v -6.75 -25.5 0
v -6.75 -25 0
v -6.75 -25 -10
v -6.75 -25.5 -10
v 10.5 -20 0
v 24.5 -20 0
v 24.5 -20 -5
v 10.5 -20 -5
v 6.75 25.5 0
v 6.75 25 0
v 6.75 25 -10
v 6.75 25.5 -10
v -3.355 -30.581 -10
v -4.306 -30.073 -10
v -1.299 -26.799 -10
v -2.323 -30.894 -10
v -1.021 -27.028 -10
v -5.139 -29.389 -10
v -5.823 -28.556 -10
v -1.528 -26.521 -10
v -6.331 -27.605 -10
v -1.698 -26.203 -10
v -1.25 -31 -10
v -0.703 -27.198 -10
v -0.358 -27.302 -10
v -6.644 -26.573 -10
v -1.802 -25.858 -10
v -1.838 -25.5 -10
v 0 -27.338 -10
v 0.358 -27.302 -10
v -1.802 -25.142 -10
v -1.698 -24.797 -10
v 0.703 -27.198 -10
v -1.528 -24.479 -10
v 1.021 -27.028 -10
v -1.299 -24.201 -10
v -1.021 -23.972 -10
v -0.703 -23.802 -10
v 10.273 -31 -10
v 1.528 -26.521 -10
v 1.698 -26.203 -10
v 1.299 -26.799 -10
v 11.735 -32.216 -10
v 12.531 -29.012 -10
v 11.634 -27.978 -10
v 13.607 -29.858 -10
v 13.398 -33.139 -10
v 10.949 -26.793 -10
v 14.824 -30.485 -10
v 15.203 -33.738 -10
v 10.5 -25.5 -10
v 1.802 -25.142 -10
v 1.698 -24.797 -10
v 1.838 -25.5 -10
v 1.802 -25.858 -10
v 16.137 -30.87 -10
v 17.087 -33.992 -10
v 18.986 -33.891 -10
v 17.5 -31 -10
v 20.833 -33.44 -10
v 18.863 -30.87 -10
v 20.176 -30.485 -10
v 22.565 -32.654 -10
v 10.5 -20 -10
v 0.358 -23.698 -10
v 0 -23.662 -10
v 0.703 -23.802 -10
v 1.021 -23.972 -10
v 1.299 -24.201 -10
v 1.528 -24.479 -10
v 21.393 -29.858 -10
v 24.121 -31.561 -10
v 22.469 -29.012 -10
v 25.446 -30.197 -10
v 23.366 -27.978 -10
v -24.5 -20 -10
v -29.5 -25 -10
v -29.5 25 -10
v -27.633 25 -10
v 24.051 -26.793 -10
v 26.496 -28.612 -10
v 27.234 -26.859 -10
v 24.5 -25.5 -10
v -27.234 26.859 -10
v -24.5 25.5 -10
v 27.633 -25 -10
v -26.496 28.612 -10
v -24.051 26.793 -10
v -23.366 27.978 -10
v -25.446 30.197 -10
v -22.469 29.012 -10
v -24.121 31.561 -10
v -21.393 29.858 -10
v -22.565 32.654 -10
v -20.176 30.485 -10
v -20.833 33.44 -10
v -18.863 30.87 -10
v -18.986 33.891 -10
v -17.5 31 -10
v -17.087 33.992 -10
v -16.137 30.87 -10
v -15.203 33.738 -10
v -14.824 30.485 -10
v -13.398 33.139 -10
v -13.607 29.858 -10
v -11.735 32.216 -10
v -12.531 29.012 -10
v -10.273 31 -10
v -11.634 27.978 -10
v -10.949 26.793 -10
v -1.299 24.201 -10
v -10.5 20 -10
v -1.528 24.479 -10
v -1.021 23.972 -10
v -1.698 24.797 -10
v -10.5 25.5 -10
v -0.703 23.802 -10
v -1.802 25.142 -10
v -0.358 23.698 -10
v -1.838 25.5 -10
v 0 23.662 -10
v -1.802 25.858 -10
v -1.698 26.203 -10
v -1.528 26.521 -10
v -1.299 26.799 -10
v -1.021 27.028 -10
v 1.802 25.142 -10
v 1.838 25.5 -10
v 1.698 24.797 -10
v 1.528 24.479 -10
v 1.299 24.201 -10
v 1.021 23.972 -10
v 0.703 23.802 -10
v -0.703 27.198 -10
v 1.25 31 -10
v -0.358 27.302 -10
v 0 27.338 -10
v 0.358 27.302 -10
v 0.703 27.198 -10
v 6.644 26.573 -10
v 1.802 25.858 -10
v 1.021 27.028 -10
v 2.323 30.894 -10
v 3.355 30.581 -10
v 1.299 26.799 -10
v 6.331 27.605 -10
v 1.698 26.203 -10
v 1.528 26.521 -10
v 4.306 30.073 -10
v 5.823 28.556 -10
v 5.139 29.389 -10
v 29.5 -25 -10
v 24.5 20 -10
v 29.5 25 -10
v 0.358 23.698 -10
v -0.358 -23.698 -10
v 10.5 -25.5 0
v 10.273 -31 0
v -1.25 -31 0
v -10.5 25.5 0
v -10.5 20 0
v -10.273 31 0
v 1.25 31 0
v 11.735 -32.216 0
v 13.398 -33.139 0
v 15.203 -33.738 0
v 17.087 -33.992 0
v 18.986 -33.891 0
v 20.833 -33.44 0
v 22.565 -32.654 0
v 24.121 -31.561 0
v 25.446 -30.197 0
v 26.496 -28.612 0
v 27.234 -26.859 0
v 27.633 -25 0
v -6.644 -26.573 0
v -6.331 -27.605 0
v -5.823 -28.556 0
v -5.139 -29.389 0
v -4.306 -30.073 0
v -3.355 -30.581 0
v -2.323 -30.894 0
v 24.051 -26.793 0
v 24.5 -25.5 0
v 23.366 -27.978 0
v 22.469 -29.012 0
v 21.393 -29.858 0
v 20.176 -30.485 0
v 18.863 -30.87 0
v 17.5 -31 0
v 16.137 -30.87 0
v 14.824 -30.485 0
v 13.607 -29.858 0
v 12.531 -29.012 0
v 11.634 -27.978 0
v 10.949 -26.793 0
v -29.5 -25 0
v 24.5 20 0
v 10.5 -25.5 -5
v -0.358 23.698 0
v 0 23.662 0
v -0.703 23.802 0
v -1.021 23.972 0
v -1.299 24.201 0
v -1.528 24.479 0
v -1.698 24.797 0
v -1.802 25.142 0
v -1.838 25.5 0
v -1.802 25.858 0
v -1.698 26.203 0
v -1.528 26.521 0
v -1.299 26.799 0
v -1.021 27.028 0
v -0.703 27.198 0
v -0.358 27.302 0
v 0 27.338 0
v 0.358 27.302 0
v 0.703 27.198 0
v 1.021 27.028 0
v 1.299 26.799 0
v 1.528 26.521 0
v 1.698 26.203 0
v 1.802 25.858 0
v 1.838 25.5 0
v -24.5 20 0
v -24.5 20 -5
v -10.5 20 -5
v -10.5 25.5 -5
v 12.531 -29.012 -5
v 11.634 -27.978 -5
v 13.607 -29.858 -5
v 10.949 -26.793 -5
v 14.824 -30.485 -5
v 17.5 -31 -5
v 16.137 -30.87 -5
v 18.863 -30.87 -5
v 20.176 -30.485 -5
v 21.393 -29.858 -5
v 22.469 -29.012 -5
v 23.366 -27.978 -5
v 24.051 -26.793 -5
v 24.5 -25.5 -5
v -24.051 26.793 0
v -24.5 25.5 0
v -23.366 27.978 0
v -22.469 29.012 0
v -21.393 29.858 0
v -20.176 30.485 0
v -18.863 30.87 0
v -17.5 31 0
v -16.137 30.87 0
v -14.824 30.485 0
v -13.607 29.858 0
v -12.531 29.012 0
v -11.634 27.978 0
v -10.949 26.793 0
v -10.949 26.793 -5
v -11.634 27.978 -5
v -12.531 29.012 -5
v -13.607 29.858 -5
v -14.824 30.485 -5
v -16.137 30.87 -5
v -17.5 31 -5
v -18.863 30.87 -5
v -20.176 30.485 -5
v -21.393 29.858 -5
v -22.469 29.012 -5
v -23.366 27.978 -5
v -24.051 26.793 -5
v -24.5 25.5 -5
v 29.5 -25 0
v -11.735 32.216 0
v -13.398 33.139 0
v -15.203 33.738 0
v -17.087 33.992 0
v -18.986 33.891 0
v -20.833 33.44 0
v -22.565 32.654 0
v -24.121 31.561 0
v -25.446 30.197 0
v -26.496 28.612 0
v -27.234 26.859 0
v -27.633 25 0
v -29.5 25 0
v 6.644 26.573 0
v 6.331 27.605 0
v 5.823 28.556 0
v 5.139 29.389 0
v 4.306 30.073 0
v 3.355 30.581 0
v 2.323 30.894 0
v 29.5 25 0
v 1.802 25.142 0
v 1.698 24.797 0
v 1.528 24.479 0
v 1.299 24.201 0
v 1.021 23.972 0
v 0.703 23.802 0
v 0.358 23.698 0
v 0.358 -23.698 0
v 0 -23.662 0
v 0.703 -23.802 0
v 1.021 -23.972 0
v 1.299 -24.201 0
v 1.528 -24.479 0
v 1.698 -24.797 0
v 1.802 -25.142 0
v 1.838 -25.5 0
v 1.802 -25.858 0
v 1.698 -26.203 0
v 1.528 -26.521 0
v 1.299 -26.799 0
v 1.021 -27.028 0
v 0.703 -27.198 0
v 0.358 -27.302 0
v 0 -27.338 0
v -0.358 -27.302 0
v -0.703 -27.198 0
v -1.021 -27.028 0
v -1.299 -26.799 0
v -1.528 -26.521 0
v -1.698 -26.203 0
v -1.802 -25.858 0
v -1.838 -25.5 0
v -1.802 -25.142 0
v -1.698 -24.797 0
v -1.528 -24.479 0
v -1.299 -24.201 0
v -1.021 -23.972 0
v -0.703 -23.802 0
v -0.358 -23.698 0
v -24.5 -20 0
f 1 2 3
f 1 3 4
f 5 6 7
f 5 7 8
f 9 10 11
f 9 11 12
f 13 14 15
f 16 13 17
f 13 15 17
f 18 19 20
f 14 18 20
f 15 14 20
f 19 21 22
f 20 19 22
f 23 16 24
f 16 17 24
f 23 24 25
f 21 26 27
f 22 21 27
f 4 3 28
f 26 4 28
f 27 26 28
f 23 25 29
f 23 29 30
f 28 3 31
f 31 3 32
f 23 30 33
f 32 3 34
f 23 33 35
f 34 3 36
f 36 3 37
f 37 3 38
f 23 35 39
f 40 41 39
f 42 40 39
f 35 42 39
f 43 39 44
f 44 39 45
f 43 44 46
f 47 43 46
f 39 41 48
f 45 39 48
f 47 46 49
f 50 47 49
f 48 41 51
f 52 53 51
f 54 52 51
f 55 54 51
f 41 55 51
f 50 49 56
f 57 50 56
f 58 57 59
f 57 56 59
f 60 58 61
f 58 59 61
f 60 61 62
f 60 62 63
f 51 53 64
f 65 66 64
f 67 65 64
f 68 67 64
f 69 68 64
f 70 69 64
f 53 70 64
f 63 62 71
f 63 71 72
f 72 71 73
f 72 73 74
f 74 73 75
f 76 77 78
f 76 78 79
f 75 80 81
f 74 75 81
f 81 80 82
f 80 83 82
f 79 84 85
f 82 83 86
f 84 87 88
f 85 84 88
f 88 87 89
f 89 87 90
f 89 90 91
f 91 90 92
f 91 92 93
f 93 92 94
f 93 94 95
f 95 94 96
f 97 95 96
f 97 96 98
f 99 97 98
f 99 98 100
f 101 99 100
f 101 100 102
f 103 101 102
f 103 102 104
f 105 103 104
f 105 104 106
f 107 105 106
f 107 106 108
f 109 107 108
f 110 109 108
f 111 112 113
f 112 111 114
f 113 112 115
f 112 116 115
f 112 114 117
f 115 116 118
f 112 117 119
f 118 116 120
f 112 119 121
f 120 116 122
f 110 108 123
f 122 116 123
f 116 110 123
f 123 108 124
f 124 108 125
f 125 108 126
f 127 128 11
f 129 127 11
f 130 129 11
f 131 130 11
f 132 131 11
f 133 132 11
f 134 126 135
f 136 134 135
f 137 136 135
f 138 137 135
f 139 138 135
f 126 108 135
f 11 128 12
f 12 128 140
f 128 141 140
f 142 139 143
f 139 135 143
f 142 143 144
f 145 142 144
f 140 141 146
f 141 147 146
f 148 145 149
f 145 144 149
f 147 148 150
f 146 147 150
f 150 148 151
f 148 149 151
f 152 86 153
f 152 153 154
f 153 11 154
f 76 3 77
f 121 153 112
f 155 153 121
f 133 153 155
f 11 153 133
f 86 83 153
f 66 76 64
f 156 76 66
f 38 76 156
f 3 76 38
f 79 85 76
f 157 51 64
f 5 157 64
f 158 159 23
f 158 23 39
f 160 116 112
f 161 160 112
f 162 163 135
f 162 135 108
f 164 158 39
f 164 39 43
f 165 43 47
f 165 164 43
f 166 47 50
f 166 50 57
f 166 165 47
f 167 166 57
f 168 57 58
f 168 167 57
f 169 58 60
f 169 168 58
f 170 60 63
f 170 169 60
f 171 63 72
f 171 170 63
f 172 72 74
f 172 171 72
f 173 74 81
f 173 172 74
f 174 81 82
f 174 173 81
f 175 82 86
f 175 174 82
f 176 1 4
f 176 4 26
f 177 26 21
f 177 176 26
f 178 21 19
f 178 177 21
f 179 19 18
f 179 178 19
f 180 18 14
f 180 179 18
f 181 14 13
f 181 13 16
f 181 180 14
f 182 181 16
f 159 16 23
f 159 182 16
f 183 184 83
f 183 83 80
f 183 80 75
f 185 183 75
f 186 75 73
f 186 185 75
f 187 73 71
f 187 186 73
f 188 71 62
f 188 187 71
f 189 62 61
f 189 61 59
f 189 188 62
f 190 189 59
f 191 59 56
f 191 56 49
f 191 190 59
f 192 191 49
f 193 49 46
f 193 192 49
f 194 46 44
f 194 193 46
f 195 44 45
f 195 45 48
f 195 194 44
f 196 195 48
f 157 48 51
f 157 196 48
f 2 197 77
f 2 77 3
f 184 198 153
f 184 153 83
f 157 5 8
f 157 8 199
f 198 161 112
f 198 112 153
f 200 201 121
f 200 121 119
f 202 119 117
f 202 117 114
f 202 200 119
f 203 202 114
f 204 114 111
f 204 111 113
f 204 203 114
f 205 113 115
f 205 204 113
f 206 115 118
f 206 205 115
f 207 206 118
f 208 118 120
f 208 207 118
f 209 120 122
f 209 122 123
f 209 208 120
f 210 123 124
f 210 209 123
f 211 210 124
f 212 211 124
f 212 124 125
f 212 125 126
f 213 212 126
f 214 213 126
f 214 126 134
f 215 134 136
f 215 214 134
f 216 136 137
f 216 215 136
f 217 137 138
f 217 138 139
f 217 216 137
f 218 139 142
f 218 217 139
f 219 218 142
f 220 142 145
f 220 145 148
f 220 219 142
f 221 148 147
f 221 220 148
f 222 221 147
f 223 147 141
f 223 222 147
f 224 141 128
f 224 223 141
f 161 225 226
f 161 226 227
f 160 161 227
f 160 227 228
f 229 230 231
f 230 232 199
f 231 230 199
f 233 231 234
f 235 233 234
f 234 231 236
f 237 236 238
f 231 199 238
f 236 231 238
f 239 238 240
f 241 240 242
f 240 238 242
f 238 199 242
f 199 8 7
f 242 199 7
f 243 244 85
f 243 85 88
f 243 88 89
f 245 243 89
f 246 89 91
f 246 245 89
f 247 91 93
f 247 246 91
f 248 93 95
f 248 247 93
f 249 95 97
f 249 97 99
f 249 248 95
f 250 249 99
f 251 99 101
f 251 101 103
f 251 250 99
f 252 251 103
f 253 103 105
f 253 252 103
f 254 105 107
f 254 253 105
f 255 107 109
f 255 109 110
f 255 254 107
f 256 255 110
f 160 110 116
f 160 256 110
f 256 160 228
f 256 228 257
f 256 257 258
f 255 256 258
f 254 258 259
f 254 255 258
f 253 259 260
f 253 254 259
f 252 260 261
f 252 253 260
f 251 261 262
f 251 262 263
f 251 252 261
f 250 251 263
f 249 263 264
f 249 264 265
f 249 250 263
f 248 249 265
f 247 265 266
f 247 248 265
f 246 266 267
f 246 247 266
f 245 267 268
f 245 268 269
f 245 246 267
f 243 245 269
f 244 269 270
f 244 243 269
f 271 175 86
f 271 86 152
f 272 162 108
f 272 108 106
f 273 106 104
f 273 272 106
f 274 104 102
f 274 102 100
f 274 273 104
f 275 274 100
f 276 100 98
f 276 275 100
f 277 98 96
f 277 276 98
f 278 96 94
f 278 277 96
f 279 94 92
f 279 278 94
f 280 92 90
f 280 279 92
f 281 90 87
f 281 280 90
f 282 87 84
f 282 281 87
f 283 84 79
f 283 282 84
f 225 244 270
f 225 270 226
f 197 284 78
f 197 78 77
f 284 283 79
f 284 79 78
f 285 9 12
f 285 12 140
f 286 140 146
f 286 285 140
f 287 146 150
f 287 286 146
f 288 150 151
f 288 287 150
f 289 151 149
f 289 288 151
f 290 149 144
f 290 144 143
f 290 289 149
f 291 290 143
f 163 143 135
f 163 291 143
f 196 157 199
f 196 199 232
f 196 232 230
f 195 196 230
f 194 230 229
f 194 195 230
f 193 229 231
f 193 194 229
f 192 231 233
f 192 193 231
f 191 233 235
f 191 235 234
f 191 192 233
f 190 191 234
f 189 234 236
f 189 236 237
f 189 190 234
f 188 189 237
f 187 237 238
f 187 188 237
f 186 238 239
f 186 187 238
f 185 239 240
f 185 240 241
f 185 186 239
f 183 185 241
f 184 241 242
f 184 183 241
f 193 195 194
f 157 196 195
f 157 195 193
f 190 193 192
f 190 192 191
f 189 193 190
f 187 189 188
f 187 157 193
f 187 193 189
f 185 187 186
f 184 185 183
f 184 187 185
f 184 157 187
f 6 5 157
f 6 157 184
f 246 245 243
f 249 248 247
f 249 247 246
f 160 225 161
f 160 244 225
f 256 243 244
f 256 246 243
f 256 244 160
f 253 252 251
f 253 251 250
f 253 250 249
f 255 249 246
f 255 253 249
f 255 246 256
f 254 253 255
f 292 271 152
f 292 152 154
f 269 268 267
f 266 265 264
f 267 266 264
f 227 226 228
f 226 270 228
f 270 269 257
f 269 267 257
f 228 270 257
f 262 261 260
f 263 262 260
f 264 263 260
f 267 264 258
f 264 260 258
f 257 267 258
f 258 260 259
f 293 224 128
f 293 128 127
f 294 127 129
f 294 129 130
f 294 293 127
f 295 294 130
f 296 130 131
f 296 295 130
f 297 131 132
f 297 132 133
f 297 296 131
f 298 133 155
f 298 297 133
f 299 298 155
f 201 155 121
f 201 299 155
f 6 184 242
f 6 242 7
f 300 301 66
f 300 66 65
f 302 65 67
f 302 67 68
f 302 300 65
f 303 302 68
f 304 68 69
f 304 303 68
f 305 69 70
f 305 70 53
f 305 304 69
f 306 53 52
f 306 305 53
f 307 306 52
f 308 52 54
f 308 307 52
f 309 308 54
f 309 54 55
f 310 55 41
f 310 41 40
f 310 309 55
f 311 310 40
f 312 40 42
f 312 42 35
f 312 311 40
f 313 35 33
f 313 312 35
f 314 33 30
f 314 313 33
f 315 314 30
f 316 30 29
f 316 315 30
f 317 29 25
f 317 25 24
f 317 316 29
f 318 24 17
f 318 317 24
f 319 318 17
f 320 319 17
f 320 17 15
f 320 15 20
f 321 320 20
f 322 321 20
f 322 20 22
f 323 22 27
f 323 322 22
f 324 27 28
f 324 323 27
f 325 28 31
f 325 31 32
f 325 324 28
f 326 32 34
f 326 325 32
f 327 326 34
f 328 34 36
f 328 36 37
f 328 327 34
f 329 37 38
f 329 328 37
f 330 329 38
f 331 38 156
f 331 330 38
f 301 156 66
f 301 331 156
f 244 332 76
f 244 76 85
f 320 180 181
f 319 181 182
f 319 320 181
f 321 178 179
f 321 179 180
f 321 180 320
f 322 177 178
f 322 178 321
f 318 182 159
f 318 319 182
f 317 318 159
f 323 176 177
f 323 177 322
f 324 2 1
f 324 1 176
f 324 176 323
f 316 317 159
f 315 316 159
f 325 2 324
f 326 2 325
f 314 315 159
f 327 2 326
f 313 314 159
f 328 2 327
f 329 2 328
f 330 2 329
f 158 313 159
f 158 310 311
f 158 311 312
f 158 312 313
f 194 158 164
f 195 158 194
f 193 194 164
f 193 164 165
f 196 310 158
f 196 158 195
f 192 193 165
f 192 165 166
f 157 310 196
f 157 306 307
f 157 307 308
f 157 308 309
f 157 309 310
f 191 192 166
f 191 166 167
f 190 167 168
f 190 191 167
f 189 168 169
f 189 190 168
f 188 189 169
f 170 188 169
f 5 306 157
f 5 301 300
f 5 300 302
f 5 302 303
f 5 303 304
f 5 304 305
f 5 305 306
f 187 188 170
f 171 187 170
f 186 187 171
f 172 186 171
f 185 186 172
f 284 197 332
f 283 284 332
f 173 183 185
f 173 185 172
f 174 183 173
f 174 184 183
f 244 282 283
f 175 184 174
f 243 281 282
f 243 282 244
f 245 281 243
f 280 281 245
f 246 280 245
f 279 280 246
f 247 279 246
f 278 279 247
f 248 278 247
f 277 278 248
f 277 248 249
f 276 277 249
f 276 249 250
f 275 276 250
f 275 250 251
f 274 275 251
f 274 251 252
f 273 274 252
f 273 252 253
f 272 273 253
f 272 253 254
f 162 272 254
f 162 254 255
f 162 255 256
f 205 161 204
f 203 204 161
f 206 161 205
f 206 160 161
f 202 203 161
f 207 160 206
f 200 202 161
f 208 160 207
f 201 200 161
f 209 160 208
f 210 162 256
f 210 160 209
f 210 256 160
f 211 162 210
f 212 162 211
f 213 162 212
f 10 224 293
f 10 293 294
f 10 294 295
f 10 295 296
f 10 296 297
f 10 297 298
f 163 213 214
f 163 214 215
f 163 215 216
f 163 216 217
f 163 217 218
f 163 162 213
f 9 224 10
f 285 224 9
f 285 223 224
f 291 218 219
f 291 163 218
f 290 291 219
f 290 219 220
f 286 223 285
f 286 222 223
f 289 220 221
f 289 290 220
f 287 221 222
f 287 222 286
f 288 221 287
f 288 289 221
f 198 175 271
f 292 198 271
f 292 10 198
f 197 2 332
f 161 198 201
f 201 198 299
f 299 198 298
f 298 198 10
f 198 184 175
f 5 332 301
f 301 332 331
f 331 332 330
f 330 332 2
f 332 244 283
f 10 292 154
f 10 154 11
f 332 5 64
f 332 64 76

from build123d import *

# Parameters (mm, degrees)
F0_DEPTH = 10
F2_DEPTH = 5


with BuildPart() as f0:
    # F1 (on Top) → F0 (new body)
    with BuildSketch(Plane.XY):
        with BuildLine():
            Line((29.5, 25), (6.75, 25))
            Line((6.75, 25), (6.75, 25.5))
            ThreePointArc((6.75, 25.5), (5.139087, 29.389087), (1.25, 31))
            Line((1.25, 31), (-10.273156, 31))
            ThreePointArc((-10.273156, 31), (-20.833426, 33.440195), (-27.633204, 25))
            Line((-27.633204, 25), (-29.5, 25))
            Line((-29.5, 25), (-29.5, -25))
            Line((-29.5, -25), (-6.75, -25))
            Line((-6.75, -25), (-6.75, -25.5))
            ThreePointArc((-6.75, -25.5), (-5.139087, -29.389087), (-1.25, -31))
            Line((-1.25, -31), (0, -31))
            Line((0, -31), (10.273156, -31))
            ThreePointArc((10.273156, -31), (20.833426, -33.440195), (27.633204, -25))
            Line((27.633204, -25), (29.5, -25))
            Line((29.5, -25), (29.5, 25))
        make_face()
        with BuildLine():
            ThreePointArc((1.8375, -25.5), (-1.299309, -26.799309), (0, -23.6625))
            ThreePointArc((0, -23.6625), (1.299309, -24.200691), (1.8375, -25.5))
        make_face(mode=Mode.SUBTRACT)
        with BuildLine():
            Line((-10.5, 25.5), (-10.5, 20))
            Line((-10.5, 20), (0, 20))
            Line((0, 20), (24.5, 20))
            Line((24.5, 20), (24.5, -20))
            Line((24.5, -20), (24.5, -25.5))
            ThreePointArc((24.5, -25.5), (17.5, -31), (10.5, -25.5))
            Line((10.5, -25.5), (10.5, -20))
            Line((10.5, -20), (0, -20))
            Line((0, -20), (-6.75, -20))
            Line((-6.75, -20), (-24.5, -20))
            Line((-24.5, -20), (-24.5, 20))
            Line((-24.5, 20), (-24.5, 25.5))
            ThreePointArc((-24.5, 25.5), (-17.5, 31), (-10.5, 25.5))
        make_face(mode=Mode.SUBTRACT)
        with BuildLine():
            ThreePointArc((1.8375, 25.5), (1.299309, 24.200691), (0, 23.6625))
            ThreePointArc((0, 23.6625), (-1.299309, 26.799309), (1.8375, 25.5))
        make_face(mode=Mode.SUBTRACT)
    extrude(amount=-F0_DEPTH)


with BuildPart() as f2:
    # F1 (on Top) → F2 (new body)
    with BuildSketch(Plane.XY):
        with BuildLine():
            Line((-24.5, 20), (-10.5, 20))
            Line((-10.5, 20), (-10.5, 25.5))
            ThreePointArc((-10.5, 25.5), (-17.5, 31), (-24.5, 25.5))
            Line((-24.5, 25.5), (-24.5, 20))
        make_face()
        with BuildLine():
            Line((24.5, -25.5), (24.5, -20))
            Line((24.5, -20), (10.5, -20))
            Line((10.5, -20), (10.5, -25.5))
            ThreePointArc((10.5, -25.5), (17.5, -31), (24.5, -25.5))
        make_face()
    extrude(amount=-F2_DEPTH)


solid = Compound([f0.part, f2.part])
